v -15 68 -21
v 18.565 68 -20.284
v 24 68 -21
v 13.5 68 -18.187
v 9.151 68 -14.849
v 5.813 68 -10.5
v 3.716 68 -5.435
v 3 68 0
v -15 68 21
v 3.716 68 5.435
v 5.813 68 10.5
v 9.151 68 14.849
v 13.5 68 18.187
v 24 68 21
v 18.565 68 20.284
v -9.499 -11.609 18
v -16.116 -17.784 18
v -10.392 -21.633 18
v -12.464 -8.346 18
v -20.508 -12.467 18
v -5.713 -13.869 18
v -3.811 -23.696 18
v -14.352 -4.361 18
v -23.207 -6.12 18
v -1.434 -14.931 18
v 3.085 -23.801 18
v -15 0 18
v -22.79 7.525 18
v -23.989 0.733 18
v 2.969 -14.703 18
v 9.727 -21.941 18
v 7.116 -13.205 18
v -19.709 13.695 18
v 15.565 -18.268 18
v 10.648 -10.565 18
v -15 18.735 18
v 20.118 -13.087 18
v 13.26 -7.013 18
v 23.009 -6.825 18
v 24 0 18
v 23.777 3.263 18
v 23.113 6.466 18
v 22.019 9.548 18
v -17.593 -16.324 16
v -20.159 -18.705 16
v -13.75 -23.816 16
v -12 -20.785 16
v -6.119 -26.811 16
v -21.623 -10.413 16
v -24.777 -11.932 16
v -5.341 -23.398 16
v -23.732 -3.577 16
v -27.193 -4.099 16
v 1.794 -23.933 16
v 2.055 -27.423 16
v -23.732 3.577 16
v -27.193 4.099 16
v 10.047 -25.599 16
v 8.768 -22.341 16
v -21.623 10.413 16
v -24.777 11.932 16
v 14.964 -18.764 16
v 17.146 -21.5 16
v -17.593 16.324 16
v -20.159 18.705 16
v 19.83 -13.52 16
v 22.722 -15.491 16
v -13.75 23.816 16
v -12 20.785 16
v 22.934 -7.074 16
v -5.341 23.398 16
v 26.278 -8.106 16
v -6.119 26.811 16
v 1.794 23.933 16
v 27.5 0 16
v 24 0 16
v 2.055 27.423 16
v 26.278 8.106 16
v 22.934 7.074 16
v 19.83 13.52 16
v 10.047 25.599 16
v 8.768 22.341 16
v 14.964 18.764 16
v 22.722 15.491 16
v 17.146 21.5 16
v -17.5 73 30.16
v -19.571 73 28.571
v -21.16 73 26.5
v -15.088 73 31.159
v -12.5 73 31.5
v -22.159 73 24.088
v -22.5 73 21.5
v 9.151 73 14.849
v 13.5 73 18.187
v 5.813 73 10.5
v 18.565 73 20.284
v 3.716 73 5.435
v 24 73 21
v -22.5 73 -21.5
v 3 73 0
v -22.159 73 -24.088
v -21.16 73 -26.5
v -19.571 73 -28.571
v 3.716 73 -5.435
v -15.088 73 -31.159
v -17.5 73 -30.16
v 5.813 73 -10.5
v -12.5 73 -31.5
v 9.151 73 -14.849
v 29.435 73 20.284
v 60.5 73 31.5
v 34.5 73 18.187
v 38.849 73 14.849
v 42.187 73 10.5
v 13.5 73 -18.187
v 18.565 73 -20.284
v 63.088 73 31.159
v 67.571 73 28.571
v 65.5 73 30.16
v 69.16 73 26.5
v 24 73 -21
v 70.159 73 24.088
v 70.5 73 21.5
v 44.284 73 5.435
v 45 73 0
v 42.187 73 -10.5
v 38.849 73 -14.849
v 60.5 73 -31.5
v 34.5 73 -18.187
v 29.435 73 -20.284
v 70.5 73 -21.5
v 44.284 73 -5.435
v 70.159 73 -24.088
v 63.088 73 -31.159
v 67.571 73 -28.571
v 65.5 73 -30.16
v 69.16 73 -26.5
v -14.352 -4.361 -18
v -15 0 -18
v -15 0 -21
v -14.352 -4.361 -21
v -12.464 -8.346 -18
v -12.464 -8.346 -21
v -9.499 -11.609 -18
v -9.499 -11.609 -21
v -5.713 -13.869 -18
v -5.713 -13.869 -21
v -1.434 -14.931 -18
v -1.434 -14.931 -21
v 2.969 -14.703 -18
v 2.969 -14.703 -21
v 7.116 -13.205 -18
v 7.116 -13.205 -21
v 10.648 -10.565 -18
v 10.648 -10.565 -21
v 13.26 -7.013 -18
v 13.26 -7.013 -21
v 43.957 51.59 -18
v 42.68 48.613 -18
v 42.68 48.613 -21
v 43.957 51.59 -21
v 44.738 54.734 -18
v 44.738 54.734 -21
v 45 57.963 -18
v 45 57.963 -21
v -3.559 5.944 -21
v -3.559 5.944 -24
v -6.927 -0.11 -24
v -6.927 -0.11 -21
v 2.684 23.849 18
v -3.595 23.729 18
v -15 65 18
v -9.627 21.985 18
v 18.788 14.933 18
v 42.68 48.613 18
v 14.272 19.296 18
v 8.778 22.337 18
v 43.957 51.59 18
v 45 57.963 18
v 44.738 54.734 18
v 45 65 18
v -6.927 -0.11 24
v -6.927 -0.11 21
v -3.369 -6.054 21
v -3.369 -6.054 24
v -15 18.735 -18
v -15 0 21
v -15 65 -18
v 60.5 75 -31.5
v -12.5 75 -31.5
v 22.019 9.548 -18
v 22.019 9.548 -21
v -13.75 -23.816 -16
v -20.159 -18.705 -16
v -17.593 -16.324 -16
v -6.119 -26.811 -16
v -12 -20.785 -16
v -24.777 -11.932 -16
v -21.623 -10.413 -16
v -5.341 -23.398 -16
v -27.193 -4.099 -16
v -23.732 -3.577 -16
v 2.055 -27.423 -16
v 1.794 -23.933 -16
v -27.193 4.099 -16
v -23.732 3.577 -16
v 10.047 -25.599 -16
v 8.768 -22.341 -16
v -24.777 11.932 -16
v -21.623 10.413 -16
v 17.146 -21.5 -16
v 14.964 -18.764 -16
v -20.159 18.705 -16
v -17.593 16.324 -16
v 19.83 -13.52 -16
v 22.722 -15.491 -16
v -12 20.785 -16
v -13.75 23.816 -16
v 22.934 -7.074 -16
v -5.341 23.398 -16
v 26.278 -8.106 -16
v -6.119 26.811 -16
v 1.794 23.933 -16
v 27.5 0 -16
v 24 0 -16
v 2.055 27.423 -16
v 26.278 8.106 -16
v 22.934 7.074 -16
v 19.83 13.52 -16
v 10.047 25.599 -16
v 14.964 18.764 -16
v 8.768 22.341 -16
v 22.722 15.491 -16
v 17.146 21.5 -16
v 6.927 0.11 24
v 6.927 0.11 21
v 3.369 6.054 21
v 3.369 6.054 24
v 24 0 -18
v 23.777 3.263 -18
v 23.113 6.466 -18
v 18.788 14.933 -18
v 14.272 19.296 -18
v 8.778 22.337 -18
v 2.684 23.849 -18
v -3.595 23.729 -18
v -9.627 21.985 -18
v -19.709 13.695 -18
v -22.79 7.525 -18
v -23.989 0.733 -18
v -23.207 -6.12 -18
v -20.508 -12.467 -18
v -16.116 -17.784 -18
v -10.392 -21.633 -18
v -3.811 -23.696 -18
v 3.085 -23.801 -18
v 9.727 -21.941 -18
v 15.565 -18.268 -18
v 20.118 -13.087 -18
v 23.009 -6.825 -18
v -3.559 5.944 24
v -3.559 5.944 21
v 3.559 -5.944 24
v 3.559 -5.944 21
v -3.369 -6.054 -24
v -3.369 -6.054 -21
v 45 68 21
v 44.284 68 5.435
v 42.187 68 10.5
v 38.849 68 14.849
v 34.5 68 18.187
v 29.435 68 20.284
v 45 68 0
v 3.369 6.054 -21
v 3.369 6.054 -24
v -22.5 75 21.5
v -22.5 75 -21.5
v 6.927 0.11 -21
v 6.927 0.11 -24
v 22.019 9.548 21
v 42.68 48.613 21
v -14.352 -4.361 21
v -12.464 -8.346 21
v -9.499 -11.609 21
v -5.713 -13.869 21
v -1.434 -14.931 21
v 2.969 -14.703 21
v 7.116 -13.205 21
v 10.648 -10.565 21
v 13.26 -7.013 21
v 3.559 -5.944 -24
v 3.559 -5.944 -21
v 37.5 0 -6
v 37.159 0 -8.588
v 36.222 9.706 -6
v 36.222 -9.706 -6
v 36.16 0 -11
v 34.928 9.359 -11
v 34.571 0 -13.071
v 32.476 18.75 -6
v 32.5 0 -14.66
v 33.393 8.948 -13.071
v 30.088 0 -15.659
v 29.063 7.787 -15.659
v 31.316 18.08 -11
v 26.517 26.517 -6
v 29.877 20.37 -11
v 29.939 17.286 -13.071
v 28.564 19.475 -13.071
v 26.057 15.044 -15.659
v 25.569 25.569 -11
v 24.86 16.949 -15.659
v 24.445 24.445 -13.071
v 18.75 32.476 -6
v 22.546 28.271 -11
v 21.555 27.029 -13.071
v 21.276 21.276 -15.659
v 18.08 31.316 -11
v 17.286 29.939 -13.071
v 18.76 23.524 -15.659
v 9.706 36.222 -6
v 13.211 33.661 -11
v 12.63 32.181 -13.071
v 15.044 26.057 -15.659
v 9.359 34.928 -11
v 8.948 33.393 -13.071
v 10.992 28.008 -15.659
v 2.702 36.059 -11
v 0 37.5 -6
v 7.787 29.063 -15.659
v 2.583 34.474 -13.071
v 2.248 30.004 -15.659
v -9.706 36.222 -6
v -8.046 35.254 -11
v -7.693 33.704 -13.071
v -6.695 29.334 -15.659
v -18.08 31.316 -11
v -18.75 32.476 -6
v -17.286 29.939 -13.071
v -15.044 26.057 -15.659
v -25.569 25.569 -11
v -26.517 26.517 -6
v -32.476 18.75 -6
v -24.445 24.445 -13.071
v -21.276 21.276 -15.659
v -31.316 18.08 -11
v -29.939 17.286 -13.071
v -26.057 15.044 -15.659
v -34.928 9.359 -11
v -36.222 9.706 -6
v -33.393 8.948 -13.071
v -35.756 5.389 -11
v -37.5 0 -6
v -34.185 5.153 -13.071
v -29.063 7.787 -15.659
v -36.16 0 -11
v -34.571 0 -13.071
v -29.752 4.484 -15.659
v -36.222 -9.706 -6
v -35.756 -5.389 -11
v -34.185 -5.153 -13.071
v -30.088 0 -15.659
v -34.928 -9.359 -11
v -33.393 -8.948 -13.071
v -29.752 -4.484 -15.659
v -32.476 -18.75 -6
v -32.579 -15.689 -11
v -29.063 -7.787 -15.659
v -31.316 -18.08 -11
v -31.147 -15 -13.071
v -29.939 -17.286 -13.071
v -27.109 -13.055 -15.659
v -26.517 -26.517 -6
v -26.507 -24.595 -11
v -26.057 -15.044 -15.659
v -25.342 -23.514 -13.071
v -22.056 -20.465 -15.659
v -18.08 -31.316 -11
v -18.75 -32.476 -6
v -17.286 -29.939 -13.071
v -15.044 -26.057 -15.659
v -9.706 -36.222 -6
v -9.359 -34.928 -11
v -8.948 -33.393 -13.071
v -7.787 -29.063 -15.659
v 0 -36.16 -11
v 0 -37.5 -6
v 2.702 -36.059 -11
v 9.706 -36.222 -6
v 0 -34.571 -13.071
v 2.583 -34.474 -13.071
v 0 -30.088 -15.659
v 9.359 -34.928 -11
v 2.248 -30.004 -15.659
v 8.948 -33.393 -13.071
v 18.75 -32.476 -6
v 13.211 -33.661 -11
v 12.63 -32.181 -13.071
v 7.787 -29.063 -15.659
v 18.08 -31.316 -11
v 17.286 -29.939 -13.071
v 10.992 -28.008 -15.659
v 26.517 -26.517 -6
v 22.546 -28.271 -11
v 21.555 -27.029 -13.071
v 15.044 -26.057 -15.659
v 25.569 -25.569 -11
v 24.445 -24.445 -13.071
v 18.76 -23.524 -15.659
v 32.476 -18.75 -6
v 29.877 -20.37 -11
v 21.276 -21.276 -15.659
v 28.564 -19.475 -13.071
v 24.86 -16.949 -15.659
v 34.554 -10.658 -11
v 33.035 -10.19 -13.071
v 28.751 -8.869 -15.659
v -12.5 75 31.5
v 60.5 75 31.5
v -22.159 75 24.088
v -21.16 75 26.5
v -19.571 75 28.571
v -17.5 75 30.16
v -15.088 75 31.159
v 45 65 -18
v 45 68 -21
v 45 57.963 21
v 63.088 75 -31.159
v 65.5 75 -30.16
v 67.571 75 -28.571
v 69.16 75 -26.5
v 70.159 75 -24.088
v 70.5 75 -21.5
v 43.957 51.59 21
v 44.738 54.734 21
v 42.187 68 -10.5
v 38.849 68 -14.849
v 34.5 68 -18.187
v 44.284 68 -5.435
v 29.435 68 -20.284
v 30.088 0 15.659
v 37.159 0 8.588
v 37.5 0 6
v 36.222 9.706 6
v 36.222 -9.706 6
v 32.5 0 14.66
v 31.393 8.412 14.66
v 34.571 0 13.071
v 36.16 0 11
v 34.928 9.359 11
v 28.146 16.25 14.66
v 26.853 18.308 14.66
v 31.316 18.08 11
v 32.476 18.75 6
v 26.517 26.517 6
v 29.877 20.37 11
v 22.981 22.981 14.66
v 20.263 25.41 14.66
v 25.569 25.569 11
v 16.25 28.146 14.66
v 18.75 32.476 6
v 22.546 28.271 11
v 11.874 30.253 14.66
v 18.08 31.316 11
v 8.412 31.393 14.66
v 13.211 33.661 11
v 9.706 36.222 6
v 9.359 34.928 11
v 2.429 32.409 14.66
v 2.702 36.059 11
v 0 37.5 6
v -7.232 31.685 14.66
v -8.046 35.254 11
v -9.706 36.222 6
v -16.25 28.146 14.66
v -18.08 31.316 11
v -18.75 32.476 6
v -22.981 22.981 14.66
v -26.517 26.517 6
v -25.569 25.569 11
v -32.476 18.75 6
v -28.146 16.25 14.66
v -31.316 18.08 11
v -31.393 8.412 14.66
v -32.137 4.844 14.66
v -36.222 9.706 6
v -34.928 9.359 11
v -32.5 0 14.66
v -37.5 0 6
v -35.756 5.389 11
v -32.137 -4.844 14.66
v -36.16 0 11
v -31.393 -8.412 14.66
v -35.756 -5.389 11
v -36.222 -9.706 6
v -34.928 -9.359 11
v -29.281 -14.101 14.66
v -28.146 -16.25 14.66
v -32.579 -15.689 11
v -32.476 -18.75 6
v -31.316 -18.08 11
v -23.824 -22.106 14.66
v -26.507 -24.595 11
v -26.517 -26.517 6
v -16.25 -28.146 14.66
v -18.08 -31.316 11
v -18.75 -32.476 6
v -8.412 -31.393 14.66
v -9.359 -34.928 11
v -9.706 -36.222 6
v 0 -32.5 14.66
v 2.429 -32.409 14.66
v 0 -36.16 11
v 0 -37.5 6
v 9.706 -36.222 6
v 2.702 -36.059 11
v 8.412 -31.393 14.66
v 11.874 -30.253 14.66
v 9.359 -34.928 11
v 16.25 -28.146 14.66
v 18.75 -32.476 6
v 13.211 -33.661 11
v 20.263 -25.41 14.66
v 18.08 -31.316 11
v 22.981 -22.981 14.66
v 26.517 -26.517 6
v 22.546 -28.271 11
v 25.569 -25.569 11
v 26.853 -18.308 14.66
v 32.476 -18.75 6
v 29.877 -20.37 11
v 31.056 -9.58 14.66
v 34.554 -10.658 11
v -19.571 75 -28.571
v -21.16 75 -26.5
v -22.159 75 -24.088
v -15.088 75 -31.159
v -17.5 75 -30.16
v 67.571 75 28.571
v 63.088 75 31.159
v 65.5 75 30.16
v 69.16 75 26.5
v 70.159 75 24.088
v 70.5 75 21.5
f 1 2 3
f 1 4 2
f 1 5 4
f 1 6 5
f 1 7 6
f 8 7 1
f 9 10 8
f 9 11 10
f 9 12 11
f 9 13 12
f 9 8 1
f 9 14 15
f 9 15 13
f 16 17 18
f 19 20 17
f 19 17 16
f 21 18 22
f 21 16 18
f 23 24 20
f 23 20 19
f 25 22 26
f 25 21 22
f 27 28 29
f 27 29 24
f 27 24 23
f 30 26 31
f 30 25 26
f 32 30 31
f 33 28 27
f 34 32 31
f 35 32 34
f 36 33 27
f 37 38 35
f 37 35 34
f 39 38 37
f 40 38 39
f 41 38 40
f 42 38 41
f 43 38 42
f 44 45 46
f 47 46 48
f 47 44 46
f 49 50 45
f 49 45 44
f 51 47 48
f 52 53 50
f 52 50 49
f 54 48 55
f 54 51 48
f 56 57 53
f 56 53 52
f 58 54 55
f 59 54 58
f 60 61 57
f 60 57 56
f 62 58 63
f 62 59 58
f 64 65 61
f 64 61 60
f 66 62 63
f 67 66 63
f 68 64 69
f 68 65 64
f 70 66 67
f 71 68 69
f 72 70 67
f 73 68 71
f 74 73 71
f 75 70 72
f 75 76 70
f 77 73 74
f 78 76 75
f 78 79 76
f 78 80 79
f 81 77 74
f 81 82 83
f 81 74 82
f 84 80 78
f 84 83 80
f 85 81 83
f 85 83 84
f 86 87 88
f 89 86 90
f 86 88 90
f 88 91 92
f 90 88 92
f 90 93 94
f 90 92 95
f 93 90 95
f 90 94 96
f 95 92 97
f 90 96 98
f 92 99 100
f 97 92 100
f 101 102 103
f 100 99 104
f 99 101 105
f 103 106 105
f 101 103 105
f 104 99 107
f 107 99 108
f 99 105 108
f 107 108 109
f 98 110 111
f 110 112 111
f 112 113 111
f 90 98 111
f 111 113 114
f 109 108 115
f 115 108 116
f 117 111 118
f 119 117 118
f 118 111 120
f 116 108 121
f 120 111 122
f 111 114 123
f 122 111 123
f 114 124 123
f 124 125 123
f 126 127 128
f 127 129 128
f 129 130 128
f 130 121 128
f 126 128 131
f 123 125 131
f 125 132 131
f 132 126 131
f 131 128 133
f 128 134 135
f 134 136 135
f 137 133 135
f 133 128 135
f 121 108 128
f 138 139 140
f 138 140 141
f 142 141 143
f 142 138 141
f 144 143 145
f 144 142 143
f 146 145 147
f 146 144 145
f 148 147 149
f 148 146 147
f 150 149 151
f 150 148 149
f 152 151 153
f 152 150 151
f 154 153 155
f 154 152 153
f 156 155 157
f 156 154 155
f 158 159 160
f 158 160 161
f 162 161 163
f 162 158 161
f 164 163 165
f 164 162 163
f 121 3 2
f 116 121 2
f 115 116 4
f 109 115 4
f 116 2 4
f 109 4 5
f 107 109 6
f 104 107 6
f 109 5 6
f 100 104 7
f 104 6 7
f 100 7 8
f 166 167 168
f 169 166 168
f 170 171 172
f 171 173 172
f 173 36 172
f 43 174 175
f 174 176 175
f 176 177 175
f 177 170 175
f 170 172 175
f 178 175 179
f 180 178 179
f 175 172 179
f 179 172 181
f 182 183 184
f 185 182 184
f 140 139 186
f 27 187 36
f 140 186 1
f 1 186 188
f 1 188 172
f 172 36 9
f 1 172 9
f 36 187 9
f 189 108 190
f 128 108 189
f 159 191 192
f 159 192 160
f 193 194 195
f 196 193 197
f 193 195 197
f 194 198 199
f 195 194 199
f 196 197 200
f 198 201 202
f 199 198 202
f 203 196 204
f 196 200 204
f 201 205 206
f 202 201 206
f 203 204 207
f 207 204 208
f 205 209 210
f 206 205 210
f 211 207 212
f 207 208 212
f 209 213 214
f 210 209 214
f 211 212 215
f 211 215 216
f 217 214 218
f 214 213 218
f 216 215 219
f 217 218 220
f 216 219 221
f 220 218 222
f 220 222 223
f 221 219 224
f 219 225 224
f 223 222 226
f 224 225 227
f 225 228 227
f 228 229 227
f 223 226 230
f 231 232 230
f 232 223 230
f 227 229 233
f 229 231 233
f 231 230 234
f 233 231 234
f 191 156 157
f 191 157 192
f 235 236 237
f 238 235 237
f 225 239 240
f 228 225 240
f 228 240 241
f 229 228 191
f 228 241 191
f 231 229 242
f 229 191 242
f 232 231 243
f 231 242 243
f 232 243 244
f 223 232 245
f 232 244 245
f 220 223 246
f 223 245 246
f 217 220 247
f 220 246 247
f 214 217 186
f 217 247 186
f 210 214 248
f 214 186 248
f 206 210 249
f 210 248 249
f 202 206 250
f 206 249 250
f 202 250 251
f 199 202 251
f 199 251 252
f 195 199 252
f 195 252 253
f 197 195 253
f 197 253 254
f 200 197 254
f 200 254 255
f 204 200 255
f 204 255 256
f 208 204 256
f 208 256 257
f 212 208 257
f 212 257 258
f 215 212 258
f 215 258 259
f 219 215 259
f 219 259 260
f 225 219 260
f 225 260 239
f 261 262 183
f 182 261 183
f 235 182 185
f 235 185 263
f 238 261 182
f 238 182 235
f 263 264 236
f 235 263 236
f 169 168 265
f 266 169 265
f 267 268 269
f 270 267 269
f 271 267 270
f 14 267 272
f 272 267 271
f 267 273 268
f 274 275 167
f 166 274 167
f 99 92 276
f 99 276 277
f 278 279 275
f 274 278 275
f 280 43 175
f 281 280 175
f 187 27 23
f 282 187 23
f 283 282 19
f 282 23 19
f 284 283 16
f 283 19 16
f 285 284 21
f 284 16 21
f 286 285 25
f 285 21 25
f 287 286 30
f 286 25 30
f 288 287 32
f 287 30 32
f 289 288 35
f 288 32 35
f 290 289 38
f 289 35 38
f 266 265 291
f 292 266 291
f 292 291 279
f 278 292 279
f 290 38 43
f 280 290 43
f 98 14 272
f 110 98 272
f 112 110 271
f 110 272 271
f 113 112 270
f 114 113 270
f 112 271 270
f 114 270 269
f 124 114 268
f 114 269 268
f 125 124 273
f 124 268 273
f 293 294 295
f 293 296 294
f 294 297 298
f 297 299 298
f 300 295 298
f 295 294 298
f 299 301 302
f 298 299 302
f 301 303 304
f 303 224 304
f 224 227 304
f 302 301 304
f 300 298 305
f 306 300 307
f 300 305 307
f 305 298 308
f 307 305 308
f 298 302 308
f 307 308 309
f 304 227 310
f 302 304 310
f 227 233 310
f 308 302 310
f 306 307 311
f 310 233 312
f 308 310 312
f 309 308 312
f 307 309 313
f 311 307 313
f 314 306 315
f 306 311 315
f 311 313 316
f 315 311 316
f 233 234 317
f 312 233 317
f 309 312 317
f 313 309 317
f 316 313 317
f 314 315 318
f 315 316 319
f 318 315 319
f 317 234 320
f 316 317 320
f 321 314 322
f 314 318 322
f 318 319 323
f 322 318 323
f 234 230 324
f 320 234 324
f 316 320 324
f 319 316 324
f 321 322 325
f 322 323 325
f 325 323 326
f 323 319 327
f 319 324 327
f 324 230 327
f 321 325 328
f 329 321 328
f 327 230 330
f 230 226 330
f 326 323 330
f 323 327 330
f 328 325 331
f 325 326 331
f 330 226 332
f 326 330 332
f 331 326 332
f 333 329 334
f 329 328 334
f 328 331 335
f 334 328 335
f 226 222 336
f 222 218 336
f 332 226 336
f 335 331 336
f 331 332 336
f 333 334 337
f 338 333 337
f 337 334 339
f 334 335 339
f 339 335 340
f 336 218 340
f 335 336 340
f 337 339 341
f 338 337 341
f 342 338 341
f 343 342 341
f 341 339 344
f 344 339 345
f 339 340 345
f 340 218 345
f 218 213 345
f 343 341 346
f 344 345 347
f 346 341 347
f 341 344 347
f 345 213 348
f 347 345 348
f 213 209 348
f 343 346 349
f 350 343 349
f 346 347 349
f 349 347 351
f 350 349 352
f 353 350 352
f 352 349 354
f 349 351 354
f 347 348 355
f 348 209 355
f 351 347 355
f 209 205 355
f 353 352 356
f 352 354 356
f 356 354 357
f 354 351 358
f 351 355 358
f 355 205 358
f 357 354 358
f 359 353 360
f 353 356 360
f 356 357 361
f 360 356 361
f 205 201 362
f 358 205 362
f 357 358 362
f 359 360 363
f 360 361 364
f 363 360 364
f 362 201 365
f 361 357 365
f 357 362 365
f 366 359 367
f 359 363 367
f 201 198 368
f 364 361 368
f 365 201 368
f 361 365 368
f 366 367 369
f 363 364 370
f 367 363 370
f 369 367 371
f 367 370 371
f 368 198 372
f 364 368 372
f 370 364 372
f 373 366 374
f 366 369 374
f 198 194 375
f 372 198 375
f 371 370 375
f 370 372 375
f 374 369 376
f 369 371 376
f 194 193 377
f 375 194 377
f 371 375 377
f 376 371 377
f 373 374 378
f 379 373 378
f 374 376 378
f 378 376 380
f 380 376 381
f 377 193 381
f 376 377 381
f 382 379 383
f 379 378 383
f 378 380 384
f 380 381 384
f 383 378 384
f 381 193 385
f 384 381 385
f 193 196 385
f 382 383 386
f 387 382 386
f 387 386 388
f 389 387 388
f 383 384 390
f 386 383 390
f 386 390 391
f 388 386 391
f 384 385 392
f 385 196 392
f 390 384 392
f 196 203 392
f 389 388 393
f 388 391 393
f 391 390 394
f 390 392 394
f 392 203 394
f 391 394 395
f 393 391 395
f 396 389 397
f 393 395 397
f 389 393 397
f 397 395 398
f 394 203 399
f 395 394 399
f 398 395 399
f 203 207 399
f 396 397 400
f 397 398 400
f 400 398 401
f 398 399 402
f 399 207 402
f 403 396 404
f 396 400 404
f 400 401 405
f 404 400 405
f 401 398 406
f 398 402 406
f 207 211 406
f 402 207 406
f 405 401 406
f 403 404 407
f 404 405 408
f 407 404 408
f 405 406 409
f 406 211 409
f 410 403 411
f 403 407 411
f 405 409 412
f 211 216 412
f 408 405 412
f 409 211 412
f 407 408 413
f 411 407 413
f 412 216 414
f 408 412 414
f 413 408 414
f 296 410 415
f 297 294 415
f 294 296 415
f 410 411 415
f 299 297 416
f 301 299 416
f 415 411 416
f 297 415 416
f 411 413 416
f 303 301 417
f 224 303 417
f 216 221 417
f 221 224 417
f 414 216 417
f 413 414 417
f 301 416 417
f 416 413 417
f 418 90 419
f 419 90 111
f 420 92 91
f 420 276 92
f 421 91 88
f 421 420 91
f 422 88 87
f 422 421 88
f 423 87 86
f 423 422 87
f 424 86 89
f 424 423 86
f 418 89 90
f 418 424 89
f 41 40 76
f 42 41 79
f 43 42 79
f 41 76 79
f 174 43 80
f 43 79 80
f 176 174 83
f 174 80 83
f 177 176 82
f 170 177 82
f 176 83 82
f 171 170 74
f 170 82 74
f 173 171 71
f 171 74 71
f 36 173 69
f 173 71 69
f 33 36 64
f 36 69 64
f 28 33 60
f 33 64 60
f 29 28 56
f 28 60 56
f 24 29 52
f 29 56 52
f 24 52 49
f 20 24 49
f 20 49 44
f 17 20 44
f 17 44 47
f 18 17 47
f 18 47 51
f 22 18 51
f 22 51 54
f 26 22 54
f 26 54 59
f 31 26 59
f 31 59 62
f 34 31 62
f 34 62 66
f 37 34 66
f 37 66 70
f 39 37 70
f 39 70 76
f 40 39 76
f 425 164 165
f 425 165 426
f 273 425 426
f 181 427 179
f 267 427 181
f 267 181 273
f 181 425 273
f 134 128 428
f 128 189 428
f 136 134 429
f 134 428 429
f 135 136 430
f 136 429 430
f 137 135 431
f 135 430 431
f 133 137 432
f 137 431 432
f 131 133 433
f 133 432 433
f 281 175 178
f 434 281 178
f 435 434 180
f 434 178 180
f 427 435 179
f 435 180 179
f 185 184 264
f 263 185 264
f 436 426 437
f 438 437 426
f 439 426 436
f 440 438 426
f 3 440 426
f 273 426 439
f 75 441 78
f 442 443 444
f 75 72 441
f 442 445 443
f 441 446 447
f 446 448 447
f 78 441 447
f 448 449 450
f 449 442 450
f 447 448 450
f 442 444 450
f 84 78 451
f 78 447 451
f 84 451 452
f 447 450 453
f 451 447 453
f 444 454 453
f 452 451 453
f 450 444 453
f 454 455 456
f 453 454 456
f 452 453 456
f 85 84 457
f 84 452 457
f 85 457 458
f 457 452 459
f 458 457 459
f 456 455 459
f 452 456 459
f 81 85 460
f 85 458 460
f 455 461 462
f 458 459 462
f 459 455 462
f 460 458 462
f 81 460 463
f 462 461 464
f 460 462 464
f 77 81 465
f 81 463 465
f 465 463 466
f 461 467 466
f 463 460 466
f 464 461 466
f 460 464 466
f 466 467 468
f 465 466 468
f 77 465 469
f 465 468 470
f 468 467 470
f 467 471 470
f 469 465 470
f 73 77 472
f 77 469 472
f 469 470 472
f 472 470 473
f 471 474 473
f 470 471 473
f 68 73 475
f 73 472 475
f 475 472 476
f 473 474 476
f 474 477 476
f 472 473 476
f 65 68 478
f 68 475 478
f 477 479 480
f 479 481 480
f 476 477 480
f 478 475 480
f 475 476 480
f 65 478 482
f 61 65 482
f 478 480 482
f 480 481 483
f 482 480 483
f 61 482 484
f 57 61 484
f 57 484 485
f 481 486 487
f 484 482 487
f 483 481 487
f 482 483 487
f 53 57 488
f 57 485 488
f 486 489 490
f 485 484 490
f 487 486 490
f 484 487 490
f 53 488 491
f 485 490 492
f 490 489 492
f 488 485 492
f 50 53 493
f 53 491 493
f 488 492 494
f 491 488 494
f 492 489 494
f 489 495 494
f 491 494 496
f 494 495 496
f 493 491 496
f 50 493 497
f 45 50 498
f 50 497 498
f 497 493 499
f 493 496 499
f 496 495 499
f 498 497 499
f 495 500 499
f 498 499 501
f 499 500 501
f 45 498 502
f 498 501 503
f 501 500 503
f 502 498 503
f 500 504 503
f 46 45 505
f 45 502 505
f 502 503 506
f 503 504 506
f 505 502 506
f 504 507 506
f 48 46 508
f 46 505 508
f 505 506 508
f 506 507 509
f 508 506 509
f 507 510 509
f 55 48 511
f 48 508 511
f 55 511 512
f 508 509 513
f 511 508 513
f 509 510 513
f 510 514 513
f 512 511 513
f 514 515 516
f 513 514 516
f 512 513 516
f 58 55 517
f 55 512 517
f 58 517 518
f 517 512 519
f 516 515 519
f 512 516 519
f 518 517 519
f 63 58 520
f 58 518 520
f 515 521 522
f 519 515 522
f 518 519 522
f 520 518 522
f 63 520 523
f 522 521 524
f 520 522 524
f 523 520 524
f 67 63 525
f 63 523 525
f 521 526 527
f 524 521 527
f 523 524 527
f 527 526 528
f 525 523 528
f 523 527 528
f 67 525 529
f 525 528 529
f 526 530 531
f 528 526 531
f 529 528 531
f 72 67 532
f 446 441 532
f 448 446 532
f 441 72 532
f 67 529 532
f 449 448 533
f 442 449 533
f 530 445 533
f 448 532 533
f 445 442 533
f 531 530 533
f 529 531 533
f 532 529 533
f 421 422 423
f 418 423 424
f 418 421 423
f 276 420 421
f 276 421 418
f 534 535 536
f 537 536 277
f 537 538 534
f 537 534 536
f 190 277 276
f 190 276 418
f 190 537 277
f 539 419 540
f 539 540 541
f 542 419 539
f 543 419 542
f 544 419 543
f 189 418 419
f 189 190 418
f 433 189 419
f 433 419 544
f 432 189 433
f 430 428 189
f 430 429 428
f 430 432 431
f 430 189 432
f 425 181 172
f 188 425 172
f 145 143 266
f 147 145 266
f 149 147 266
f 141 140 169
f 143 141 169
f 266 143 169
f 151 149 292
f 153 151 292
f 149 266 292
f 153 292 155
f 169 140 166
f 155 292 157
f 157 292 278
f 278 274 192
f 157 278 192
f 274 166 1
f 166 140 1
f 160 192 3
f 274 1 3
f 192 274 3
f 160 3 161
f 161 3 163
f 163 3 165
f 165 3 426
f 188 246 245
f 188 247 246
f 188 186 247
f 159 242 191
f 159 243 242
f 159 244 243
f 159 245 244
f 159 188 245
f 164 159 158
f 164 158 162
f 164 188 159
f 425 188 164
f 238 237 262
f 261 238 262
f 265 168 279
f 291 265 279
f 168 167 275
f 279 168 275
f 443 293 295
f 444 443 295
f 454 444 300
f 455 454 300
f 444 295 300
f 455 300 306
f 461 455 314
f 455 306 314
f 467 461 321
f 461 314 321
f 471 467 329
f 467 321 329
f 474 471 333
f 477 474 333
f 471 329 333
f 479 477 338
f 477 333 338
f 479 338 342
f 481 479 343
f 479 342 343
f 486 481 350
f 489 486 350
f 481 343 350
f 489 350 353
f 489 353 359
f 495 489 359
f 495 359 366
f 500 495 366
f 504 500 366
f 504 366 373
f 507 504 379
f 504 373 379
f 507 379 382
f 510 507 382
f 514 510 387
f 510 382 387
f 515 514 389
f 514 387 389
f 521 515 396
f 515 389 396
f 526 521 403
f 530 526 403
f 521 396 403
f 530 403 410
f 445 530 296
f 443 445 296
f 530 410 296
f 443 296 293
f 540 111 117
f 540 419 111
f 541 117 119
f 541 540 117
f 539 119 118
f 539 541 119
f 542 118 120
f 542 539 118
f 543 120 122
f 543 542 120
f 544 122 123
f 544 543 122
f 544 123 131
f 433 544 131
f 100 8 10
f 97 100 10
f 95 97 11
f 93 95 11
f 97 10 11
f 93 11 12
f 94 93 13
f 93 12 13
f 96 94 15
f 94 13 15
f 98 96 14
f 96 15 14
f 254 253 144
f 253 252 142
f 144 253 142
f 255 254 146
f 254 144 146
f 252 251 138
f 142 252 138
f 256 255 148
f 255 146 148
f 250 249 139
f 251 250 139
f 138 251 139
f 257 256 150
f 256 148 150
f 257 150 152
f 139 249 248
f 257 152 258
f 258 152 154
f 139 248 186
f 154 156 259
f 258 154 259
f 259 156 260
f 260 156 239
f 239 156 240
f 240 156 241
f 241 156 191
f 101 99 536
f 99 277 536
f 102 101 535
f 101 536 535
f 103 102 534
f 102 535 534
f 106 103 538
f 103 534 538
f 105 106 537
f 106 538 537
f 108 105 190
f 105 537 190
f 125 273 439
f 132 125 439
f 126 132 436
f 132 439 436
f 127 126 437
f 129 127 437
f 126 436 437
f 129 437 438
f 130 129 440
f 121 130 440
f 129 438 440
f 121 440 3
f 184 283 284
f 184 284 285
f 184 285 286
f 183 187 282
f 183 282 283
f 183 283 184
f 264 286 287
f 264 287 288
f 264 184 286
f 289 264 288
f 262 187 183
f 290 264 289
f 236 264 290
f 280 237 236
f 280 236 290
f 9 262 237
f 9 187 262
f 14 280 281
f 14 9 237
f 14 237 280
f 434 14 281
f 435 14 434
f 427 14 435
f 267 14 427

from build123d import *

# Parameters (mm, degrees)
EXTRUDE_1_DEPTH      = 16
EXTRUDE_1_DEPTH_BACK = 16
SKETCH_1_R           = 37.5
SKETCH_1_R_2         = 24
EXTRUDE_2_DEPTH      = 18
EXTRUDE_2_DEPTH_BACK = 18
SKETCH_1_3_R         = 24
EXTRUDE_3_DEPTH      = 24
EXTRUDE_3_DEPTH_BACK = 24
EXTRUDE_4_DEPTH      = 3
EXTRUDE_5_REACH      = 93.722
SKETCH_3_W           = 60
SKETCH_3_H           = 3
SKETCH_4_R           = 21
EXTRUDE_6_DEPTH      = 5
SKETCH_5_R           = 21
EXTRUDE_7_DEPTH      = 2
SKETCH_5_3_W         = 93
SKETCH_5_3_H         = 63
SKETCH_5_3_R         = 21
EXTRUDE_8_DEPTH      = 2
FILLET_1_R           = 10
FILLET_2_R           = 10
FILLET_3_R           = 10


with BuildPart() as part:
    # 스케치1 → 보스-돌출1 (new, two sides: drawn at the far end of the back side and taken through both)
    with BuildSketch(Plane.XY.offset(-EXTRUDE_1_DEPTH_BACK)):
        Circle(SKETCH_1_R)
        Circle(SKETCH_1_R_2, mode=Mode.SUBTRACT)
    extrude(amount=EXTRUDE_1_DEPTH + EXTRUDE_1_DEPTH_BACK)

    # 스케치1<3> → 보스-돌출2 (add, two sides: drawn at the far end of the back side and taken through both)
    with BuildSketch(Plane.XY.offset(-EXTRUDE_2_DEPTH_BACK)):
        Circle(SKETCH_1_3_R)
        Polygon((-3.558612013, 5.944432735), (3.368723753, 6.054064773), (6.927335766, 0.109632038), (3.558612013, -5.944432735), (-3.368723753, -6.054064773), (-6.927335766, -0.109632038), align=None, mode=Mode.SUBTRACT)
    extrude(amount=EXTRUDE_2_DEPTH + EXTRUDE_2_DEPTH_BACK)

    # 스케치1<4> → 보스-돌출3 (add, two sides: drawn at the far end of the back side and taken through both)
    with BuildSketch(Plane.XY.offset(-EXTRUDE_3_DEPTH_BACK)):
        Polygon((6.927335766, 0.109632038), (3.368723753, 6.054064773), (-3.558612013, 5.944432735), (-6.927335766, -0.109632038), (-3.368723753, -6.054064773), (3.558612013, -5.944432735), align=None)
    extrude(amount=EXTRUDE_3_DEPTH + EXTRUDE_3_DEPTH_BACK)

    # 스케치2 → 보스-돌출4 (add)
    with BuildSketch(Plane.XY.offset(18)):
        with BuildLine():
            ThreePointArc((-15, 0), (-3.612820883, -14.558417677), (13.259670035, -7.012927388))
            Line((13.259670035, -7.012927388), (42.679560047, 48.612635579))
            ThreePointArc((42.679560047, 48.612635579), (44.41122357, 53.146110919), (45, 57.96320543))
            Line((45, 57.96320543), (45, 68))
            Line((45, 68), (-15, 68))
            Line((-15, 68), (-15, 0))
        make_face()
        Polygon((3.368723753, 6.054064773), (6.927335766, 0.109632038), (3.558612013, -5.944432735), (-3.368723753, -6.054064773), (-6.927335766, -0.109632038), (-3.558612013, 5.944432735), align=None, mode=Mode.SUBTRACT)
    extrude_4 = extrude(amount=EXTRUDE_4_DEPTH)

    # 대칭 복사1: 보스-돌출4 across plane
    add(extrude_4.mirror(Plane.XY))

    # 스케치3 → 보스-돌출5 (add, up to next)
    with BuildSketch(Plane(origin=(0, 0, 18), x_dir=(-1, 0, 0), z_dir=(0, 0, -1)), mode=Mode.PRIVATE) as extrude_5_sk1:
        with Locations((-15, 66.5)):
            Rectangle(SKETCH_3_W, SKETCH_3_H)
    extrude_5_tool1 = extrude(extrude_5_sk1.sketch, amount=EXTRUDE_5_REACH, mode=Mode.PRIVATE) - part.part
    add(extrude_5_tool1.solids().sort_by_distance((15, 66.5, 18))[0])

    # 스케치4 → 보스-돌출6 (add)
    with BuildSketch(Plane(origin=(0, 68, 0), x_dir=(1, 0, 0), z_dir=(0, 1, 0))):
        with Locations((24, 0)):
            Circle(SKETCH_4_R)
    extrude(amount=EXTRUDE_6_DEPTH)

    # 스케치5 → 보스-돌출7 (add)
    with BuildSketch(Plane(origin=(0, 73, 0), x_dir=(1, 0, 0), z_dir=(0, 1, 0))):
        with Locations((24, 0)):
            Circle(SKETCH_5_R)
    extrude(amount=EXTRUDE_7_DEPTH)

    # 스케치5<3> → 보스-돌출8 (add)
    with BuildSketch(Plane(origin=(0, 73, 0), x_dir=(1, 0, 0), z_dir=(0, 1, 0))):
        with Locations((24, 0)):
            Rectangle(SKETCH_5_3_W, SKETCH_5_3_H)
        with Locations((24, 0)):
            Circle(SKETCH_5_3_R, mode=Mode.SUBTRACT)
    extrude(amount=EXTRUDE_8_DEPTH)

    # 필렛1
    fillet_1_edges = [part.edges().sort_by_distance(p)[0] for p in [
        (-22.5, 74, 31.5),
        (-22.5, 74, -31.5),
        (70.5, 74, -31.5),
        (70.5, 74, 31.5),
    ]]
    fillet(fillet_1_edges, radius=FILLET_1_R)

    # 필렛2
    fillet_2_edges = [part.edges().sort_by_distance(p)[0] for p in [
        (-37.5, 0, 16),
    ]]
    fillet(fillet_2_edges, radius=FILLET_2_R)

    # 필렛3
    fillet_3_edges = [part.edges().sort_by_distance(p)[0] for p in [
        (-37.5, 0, -16),
    ]]
    fillet(fillet_3_edges, radius=FILLET_3_R)


solid = part.part
